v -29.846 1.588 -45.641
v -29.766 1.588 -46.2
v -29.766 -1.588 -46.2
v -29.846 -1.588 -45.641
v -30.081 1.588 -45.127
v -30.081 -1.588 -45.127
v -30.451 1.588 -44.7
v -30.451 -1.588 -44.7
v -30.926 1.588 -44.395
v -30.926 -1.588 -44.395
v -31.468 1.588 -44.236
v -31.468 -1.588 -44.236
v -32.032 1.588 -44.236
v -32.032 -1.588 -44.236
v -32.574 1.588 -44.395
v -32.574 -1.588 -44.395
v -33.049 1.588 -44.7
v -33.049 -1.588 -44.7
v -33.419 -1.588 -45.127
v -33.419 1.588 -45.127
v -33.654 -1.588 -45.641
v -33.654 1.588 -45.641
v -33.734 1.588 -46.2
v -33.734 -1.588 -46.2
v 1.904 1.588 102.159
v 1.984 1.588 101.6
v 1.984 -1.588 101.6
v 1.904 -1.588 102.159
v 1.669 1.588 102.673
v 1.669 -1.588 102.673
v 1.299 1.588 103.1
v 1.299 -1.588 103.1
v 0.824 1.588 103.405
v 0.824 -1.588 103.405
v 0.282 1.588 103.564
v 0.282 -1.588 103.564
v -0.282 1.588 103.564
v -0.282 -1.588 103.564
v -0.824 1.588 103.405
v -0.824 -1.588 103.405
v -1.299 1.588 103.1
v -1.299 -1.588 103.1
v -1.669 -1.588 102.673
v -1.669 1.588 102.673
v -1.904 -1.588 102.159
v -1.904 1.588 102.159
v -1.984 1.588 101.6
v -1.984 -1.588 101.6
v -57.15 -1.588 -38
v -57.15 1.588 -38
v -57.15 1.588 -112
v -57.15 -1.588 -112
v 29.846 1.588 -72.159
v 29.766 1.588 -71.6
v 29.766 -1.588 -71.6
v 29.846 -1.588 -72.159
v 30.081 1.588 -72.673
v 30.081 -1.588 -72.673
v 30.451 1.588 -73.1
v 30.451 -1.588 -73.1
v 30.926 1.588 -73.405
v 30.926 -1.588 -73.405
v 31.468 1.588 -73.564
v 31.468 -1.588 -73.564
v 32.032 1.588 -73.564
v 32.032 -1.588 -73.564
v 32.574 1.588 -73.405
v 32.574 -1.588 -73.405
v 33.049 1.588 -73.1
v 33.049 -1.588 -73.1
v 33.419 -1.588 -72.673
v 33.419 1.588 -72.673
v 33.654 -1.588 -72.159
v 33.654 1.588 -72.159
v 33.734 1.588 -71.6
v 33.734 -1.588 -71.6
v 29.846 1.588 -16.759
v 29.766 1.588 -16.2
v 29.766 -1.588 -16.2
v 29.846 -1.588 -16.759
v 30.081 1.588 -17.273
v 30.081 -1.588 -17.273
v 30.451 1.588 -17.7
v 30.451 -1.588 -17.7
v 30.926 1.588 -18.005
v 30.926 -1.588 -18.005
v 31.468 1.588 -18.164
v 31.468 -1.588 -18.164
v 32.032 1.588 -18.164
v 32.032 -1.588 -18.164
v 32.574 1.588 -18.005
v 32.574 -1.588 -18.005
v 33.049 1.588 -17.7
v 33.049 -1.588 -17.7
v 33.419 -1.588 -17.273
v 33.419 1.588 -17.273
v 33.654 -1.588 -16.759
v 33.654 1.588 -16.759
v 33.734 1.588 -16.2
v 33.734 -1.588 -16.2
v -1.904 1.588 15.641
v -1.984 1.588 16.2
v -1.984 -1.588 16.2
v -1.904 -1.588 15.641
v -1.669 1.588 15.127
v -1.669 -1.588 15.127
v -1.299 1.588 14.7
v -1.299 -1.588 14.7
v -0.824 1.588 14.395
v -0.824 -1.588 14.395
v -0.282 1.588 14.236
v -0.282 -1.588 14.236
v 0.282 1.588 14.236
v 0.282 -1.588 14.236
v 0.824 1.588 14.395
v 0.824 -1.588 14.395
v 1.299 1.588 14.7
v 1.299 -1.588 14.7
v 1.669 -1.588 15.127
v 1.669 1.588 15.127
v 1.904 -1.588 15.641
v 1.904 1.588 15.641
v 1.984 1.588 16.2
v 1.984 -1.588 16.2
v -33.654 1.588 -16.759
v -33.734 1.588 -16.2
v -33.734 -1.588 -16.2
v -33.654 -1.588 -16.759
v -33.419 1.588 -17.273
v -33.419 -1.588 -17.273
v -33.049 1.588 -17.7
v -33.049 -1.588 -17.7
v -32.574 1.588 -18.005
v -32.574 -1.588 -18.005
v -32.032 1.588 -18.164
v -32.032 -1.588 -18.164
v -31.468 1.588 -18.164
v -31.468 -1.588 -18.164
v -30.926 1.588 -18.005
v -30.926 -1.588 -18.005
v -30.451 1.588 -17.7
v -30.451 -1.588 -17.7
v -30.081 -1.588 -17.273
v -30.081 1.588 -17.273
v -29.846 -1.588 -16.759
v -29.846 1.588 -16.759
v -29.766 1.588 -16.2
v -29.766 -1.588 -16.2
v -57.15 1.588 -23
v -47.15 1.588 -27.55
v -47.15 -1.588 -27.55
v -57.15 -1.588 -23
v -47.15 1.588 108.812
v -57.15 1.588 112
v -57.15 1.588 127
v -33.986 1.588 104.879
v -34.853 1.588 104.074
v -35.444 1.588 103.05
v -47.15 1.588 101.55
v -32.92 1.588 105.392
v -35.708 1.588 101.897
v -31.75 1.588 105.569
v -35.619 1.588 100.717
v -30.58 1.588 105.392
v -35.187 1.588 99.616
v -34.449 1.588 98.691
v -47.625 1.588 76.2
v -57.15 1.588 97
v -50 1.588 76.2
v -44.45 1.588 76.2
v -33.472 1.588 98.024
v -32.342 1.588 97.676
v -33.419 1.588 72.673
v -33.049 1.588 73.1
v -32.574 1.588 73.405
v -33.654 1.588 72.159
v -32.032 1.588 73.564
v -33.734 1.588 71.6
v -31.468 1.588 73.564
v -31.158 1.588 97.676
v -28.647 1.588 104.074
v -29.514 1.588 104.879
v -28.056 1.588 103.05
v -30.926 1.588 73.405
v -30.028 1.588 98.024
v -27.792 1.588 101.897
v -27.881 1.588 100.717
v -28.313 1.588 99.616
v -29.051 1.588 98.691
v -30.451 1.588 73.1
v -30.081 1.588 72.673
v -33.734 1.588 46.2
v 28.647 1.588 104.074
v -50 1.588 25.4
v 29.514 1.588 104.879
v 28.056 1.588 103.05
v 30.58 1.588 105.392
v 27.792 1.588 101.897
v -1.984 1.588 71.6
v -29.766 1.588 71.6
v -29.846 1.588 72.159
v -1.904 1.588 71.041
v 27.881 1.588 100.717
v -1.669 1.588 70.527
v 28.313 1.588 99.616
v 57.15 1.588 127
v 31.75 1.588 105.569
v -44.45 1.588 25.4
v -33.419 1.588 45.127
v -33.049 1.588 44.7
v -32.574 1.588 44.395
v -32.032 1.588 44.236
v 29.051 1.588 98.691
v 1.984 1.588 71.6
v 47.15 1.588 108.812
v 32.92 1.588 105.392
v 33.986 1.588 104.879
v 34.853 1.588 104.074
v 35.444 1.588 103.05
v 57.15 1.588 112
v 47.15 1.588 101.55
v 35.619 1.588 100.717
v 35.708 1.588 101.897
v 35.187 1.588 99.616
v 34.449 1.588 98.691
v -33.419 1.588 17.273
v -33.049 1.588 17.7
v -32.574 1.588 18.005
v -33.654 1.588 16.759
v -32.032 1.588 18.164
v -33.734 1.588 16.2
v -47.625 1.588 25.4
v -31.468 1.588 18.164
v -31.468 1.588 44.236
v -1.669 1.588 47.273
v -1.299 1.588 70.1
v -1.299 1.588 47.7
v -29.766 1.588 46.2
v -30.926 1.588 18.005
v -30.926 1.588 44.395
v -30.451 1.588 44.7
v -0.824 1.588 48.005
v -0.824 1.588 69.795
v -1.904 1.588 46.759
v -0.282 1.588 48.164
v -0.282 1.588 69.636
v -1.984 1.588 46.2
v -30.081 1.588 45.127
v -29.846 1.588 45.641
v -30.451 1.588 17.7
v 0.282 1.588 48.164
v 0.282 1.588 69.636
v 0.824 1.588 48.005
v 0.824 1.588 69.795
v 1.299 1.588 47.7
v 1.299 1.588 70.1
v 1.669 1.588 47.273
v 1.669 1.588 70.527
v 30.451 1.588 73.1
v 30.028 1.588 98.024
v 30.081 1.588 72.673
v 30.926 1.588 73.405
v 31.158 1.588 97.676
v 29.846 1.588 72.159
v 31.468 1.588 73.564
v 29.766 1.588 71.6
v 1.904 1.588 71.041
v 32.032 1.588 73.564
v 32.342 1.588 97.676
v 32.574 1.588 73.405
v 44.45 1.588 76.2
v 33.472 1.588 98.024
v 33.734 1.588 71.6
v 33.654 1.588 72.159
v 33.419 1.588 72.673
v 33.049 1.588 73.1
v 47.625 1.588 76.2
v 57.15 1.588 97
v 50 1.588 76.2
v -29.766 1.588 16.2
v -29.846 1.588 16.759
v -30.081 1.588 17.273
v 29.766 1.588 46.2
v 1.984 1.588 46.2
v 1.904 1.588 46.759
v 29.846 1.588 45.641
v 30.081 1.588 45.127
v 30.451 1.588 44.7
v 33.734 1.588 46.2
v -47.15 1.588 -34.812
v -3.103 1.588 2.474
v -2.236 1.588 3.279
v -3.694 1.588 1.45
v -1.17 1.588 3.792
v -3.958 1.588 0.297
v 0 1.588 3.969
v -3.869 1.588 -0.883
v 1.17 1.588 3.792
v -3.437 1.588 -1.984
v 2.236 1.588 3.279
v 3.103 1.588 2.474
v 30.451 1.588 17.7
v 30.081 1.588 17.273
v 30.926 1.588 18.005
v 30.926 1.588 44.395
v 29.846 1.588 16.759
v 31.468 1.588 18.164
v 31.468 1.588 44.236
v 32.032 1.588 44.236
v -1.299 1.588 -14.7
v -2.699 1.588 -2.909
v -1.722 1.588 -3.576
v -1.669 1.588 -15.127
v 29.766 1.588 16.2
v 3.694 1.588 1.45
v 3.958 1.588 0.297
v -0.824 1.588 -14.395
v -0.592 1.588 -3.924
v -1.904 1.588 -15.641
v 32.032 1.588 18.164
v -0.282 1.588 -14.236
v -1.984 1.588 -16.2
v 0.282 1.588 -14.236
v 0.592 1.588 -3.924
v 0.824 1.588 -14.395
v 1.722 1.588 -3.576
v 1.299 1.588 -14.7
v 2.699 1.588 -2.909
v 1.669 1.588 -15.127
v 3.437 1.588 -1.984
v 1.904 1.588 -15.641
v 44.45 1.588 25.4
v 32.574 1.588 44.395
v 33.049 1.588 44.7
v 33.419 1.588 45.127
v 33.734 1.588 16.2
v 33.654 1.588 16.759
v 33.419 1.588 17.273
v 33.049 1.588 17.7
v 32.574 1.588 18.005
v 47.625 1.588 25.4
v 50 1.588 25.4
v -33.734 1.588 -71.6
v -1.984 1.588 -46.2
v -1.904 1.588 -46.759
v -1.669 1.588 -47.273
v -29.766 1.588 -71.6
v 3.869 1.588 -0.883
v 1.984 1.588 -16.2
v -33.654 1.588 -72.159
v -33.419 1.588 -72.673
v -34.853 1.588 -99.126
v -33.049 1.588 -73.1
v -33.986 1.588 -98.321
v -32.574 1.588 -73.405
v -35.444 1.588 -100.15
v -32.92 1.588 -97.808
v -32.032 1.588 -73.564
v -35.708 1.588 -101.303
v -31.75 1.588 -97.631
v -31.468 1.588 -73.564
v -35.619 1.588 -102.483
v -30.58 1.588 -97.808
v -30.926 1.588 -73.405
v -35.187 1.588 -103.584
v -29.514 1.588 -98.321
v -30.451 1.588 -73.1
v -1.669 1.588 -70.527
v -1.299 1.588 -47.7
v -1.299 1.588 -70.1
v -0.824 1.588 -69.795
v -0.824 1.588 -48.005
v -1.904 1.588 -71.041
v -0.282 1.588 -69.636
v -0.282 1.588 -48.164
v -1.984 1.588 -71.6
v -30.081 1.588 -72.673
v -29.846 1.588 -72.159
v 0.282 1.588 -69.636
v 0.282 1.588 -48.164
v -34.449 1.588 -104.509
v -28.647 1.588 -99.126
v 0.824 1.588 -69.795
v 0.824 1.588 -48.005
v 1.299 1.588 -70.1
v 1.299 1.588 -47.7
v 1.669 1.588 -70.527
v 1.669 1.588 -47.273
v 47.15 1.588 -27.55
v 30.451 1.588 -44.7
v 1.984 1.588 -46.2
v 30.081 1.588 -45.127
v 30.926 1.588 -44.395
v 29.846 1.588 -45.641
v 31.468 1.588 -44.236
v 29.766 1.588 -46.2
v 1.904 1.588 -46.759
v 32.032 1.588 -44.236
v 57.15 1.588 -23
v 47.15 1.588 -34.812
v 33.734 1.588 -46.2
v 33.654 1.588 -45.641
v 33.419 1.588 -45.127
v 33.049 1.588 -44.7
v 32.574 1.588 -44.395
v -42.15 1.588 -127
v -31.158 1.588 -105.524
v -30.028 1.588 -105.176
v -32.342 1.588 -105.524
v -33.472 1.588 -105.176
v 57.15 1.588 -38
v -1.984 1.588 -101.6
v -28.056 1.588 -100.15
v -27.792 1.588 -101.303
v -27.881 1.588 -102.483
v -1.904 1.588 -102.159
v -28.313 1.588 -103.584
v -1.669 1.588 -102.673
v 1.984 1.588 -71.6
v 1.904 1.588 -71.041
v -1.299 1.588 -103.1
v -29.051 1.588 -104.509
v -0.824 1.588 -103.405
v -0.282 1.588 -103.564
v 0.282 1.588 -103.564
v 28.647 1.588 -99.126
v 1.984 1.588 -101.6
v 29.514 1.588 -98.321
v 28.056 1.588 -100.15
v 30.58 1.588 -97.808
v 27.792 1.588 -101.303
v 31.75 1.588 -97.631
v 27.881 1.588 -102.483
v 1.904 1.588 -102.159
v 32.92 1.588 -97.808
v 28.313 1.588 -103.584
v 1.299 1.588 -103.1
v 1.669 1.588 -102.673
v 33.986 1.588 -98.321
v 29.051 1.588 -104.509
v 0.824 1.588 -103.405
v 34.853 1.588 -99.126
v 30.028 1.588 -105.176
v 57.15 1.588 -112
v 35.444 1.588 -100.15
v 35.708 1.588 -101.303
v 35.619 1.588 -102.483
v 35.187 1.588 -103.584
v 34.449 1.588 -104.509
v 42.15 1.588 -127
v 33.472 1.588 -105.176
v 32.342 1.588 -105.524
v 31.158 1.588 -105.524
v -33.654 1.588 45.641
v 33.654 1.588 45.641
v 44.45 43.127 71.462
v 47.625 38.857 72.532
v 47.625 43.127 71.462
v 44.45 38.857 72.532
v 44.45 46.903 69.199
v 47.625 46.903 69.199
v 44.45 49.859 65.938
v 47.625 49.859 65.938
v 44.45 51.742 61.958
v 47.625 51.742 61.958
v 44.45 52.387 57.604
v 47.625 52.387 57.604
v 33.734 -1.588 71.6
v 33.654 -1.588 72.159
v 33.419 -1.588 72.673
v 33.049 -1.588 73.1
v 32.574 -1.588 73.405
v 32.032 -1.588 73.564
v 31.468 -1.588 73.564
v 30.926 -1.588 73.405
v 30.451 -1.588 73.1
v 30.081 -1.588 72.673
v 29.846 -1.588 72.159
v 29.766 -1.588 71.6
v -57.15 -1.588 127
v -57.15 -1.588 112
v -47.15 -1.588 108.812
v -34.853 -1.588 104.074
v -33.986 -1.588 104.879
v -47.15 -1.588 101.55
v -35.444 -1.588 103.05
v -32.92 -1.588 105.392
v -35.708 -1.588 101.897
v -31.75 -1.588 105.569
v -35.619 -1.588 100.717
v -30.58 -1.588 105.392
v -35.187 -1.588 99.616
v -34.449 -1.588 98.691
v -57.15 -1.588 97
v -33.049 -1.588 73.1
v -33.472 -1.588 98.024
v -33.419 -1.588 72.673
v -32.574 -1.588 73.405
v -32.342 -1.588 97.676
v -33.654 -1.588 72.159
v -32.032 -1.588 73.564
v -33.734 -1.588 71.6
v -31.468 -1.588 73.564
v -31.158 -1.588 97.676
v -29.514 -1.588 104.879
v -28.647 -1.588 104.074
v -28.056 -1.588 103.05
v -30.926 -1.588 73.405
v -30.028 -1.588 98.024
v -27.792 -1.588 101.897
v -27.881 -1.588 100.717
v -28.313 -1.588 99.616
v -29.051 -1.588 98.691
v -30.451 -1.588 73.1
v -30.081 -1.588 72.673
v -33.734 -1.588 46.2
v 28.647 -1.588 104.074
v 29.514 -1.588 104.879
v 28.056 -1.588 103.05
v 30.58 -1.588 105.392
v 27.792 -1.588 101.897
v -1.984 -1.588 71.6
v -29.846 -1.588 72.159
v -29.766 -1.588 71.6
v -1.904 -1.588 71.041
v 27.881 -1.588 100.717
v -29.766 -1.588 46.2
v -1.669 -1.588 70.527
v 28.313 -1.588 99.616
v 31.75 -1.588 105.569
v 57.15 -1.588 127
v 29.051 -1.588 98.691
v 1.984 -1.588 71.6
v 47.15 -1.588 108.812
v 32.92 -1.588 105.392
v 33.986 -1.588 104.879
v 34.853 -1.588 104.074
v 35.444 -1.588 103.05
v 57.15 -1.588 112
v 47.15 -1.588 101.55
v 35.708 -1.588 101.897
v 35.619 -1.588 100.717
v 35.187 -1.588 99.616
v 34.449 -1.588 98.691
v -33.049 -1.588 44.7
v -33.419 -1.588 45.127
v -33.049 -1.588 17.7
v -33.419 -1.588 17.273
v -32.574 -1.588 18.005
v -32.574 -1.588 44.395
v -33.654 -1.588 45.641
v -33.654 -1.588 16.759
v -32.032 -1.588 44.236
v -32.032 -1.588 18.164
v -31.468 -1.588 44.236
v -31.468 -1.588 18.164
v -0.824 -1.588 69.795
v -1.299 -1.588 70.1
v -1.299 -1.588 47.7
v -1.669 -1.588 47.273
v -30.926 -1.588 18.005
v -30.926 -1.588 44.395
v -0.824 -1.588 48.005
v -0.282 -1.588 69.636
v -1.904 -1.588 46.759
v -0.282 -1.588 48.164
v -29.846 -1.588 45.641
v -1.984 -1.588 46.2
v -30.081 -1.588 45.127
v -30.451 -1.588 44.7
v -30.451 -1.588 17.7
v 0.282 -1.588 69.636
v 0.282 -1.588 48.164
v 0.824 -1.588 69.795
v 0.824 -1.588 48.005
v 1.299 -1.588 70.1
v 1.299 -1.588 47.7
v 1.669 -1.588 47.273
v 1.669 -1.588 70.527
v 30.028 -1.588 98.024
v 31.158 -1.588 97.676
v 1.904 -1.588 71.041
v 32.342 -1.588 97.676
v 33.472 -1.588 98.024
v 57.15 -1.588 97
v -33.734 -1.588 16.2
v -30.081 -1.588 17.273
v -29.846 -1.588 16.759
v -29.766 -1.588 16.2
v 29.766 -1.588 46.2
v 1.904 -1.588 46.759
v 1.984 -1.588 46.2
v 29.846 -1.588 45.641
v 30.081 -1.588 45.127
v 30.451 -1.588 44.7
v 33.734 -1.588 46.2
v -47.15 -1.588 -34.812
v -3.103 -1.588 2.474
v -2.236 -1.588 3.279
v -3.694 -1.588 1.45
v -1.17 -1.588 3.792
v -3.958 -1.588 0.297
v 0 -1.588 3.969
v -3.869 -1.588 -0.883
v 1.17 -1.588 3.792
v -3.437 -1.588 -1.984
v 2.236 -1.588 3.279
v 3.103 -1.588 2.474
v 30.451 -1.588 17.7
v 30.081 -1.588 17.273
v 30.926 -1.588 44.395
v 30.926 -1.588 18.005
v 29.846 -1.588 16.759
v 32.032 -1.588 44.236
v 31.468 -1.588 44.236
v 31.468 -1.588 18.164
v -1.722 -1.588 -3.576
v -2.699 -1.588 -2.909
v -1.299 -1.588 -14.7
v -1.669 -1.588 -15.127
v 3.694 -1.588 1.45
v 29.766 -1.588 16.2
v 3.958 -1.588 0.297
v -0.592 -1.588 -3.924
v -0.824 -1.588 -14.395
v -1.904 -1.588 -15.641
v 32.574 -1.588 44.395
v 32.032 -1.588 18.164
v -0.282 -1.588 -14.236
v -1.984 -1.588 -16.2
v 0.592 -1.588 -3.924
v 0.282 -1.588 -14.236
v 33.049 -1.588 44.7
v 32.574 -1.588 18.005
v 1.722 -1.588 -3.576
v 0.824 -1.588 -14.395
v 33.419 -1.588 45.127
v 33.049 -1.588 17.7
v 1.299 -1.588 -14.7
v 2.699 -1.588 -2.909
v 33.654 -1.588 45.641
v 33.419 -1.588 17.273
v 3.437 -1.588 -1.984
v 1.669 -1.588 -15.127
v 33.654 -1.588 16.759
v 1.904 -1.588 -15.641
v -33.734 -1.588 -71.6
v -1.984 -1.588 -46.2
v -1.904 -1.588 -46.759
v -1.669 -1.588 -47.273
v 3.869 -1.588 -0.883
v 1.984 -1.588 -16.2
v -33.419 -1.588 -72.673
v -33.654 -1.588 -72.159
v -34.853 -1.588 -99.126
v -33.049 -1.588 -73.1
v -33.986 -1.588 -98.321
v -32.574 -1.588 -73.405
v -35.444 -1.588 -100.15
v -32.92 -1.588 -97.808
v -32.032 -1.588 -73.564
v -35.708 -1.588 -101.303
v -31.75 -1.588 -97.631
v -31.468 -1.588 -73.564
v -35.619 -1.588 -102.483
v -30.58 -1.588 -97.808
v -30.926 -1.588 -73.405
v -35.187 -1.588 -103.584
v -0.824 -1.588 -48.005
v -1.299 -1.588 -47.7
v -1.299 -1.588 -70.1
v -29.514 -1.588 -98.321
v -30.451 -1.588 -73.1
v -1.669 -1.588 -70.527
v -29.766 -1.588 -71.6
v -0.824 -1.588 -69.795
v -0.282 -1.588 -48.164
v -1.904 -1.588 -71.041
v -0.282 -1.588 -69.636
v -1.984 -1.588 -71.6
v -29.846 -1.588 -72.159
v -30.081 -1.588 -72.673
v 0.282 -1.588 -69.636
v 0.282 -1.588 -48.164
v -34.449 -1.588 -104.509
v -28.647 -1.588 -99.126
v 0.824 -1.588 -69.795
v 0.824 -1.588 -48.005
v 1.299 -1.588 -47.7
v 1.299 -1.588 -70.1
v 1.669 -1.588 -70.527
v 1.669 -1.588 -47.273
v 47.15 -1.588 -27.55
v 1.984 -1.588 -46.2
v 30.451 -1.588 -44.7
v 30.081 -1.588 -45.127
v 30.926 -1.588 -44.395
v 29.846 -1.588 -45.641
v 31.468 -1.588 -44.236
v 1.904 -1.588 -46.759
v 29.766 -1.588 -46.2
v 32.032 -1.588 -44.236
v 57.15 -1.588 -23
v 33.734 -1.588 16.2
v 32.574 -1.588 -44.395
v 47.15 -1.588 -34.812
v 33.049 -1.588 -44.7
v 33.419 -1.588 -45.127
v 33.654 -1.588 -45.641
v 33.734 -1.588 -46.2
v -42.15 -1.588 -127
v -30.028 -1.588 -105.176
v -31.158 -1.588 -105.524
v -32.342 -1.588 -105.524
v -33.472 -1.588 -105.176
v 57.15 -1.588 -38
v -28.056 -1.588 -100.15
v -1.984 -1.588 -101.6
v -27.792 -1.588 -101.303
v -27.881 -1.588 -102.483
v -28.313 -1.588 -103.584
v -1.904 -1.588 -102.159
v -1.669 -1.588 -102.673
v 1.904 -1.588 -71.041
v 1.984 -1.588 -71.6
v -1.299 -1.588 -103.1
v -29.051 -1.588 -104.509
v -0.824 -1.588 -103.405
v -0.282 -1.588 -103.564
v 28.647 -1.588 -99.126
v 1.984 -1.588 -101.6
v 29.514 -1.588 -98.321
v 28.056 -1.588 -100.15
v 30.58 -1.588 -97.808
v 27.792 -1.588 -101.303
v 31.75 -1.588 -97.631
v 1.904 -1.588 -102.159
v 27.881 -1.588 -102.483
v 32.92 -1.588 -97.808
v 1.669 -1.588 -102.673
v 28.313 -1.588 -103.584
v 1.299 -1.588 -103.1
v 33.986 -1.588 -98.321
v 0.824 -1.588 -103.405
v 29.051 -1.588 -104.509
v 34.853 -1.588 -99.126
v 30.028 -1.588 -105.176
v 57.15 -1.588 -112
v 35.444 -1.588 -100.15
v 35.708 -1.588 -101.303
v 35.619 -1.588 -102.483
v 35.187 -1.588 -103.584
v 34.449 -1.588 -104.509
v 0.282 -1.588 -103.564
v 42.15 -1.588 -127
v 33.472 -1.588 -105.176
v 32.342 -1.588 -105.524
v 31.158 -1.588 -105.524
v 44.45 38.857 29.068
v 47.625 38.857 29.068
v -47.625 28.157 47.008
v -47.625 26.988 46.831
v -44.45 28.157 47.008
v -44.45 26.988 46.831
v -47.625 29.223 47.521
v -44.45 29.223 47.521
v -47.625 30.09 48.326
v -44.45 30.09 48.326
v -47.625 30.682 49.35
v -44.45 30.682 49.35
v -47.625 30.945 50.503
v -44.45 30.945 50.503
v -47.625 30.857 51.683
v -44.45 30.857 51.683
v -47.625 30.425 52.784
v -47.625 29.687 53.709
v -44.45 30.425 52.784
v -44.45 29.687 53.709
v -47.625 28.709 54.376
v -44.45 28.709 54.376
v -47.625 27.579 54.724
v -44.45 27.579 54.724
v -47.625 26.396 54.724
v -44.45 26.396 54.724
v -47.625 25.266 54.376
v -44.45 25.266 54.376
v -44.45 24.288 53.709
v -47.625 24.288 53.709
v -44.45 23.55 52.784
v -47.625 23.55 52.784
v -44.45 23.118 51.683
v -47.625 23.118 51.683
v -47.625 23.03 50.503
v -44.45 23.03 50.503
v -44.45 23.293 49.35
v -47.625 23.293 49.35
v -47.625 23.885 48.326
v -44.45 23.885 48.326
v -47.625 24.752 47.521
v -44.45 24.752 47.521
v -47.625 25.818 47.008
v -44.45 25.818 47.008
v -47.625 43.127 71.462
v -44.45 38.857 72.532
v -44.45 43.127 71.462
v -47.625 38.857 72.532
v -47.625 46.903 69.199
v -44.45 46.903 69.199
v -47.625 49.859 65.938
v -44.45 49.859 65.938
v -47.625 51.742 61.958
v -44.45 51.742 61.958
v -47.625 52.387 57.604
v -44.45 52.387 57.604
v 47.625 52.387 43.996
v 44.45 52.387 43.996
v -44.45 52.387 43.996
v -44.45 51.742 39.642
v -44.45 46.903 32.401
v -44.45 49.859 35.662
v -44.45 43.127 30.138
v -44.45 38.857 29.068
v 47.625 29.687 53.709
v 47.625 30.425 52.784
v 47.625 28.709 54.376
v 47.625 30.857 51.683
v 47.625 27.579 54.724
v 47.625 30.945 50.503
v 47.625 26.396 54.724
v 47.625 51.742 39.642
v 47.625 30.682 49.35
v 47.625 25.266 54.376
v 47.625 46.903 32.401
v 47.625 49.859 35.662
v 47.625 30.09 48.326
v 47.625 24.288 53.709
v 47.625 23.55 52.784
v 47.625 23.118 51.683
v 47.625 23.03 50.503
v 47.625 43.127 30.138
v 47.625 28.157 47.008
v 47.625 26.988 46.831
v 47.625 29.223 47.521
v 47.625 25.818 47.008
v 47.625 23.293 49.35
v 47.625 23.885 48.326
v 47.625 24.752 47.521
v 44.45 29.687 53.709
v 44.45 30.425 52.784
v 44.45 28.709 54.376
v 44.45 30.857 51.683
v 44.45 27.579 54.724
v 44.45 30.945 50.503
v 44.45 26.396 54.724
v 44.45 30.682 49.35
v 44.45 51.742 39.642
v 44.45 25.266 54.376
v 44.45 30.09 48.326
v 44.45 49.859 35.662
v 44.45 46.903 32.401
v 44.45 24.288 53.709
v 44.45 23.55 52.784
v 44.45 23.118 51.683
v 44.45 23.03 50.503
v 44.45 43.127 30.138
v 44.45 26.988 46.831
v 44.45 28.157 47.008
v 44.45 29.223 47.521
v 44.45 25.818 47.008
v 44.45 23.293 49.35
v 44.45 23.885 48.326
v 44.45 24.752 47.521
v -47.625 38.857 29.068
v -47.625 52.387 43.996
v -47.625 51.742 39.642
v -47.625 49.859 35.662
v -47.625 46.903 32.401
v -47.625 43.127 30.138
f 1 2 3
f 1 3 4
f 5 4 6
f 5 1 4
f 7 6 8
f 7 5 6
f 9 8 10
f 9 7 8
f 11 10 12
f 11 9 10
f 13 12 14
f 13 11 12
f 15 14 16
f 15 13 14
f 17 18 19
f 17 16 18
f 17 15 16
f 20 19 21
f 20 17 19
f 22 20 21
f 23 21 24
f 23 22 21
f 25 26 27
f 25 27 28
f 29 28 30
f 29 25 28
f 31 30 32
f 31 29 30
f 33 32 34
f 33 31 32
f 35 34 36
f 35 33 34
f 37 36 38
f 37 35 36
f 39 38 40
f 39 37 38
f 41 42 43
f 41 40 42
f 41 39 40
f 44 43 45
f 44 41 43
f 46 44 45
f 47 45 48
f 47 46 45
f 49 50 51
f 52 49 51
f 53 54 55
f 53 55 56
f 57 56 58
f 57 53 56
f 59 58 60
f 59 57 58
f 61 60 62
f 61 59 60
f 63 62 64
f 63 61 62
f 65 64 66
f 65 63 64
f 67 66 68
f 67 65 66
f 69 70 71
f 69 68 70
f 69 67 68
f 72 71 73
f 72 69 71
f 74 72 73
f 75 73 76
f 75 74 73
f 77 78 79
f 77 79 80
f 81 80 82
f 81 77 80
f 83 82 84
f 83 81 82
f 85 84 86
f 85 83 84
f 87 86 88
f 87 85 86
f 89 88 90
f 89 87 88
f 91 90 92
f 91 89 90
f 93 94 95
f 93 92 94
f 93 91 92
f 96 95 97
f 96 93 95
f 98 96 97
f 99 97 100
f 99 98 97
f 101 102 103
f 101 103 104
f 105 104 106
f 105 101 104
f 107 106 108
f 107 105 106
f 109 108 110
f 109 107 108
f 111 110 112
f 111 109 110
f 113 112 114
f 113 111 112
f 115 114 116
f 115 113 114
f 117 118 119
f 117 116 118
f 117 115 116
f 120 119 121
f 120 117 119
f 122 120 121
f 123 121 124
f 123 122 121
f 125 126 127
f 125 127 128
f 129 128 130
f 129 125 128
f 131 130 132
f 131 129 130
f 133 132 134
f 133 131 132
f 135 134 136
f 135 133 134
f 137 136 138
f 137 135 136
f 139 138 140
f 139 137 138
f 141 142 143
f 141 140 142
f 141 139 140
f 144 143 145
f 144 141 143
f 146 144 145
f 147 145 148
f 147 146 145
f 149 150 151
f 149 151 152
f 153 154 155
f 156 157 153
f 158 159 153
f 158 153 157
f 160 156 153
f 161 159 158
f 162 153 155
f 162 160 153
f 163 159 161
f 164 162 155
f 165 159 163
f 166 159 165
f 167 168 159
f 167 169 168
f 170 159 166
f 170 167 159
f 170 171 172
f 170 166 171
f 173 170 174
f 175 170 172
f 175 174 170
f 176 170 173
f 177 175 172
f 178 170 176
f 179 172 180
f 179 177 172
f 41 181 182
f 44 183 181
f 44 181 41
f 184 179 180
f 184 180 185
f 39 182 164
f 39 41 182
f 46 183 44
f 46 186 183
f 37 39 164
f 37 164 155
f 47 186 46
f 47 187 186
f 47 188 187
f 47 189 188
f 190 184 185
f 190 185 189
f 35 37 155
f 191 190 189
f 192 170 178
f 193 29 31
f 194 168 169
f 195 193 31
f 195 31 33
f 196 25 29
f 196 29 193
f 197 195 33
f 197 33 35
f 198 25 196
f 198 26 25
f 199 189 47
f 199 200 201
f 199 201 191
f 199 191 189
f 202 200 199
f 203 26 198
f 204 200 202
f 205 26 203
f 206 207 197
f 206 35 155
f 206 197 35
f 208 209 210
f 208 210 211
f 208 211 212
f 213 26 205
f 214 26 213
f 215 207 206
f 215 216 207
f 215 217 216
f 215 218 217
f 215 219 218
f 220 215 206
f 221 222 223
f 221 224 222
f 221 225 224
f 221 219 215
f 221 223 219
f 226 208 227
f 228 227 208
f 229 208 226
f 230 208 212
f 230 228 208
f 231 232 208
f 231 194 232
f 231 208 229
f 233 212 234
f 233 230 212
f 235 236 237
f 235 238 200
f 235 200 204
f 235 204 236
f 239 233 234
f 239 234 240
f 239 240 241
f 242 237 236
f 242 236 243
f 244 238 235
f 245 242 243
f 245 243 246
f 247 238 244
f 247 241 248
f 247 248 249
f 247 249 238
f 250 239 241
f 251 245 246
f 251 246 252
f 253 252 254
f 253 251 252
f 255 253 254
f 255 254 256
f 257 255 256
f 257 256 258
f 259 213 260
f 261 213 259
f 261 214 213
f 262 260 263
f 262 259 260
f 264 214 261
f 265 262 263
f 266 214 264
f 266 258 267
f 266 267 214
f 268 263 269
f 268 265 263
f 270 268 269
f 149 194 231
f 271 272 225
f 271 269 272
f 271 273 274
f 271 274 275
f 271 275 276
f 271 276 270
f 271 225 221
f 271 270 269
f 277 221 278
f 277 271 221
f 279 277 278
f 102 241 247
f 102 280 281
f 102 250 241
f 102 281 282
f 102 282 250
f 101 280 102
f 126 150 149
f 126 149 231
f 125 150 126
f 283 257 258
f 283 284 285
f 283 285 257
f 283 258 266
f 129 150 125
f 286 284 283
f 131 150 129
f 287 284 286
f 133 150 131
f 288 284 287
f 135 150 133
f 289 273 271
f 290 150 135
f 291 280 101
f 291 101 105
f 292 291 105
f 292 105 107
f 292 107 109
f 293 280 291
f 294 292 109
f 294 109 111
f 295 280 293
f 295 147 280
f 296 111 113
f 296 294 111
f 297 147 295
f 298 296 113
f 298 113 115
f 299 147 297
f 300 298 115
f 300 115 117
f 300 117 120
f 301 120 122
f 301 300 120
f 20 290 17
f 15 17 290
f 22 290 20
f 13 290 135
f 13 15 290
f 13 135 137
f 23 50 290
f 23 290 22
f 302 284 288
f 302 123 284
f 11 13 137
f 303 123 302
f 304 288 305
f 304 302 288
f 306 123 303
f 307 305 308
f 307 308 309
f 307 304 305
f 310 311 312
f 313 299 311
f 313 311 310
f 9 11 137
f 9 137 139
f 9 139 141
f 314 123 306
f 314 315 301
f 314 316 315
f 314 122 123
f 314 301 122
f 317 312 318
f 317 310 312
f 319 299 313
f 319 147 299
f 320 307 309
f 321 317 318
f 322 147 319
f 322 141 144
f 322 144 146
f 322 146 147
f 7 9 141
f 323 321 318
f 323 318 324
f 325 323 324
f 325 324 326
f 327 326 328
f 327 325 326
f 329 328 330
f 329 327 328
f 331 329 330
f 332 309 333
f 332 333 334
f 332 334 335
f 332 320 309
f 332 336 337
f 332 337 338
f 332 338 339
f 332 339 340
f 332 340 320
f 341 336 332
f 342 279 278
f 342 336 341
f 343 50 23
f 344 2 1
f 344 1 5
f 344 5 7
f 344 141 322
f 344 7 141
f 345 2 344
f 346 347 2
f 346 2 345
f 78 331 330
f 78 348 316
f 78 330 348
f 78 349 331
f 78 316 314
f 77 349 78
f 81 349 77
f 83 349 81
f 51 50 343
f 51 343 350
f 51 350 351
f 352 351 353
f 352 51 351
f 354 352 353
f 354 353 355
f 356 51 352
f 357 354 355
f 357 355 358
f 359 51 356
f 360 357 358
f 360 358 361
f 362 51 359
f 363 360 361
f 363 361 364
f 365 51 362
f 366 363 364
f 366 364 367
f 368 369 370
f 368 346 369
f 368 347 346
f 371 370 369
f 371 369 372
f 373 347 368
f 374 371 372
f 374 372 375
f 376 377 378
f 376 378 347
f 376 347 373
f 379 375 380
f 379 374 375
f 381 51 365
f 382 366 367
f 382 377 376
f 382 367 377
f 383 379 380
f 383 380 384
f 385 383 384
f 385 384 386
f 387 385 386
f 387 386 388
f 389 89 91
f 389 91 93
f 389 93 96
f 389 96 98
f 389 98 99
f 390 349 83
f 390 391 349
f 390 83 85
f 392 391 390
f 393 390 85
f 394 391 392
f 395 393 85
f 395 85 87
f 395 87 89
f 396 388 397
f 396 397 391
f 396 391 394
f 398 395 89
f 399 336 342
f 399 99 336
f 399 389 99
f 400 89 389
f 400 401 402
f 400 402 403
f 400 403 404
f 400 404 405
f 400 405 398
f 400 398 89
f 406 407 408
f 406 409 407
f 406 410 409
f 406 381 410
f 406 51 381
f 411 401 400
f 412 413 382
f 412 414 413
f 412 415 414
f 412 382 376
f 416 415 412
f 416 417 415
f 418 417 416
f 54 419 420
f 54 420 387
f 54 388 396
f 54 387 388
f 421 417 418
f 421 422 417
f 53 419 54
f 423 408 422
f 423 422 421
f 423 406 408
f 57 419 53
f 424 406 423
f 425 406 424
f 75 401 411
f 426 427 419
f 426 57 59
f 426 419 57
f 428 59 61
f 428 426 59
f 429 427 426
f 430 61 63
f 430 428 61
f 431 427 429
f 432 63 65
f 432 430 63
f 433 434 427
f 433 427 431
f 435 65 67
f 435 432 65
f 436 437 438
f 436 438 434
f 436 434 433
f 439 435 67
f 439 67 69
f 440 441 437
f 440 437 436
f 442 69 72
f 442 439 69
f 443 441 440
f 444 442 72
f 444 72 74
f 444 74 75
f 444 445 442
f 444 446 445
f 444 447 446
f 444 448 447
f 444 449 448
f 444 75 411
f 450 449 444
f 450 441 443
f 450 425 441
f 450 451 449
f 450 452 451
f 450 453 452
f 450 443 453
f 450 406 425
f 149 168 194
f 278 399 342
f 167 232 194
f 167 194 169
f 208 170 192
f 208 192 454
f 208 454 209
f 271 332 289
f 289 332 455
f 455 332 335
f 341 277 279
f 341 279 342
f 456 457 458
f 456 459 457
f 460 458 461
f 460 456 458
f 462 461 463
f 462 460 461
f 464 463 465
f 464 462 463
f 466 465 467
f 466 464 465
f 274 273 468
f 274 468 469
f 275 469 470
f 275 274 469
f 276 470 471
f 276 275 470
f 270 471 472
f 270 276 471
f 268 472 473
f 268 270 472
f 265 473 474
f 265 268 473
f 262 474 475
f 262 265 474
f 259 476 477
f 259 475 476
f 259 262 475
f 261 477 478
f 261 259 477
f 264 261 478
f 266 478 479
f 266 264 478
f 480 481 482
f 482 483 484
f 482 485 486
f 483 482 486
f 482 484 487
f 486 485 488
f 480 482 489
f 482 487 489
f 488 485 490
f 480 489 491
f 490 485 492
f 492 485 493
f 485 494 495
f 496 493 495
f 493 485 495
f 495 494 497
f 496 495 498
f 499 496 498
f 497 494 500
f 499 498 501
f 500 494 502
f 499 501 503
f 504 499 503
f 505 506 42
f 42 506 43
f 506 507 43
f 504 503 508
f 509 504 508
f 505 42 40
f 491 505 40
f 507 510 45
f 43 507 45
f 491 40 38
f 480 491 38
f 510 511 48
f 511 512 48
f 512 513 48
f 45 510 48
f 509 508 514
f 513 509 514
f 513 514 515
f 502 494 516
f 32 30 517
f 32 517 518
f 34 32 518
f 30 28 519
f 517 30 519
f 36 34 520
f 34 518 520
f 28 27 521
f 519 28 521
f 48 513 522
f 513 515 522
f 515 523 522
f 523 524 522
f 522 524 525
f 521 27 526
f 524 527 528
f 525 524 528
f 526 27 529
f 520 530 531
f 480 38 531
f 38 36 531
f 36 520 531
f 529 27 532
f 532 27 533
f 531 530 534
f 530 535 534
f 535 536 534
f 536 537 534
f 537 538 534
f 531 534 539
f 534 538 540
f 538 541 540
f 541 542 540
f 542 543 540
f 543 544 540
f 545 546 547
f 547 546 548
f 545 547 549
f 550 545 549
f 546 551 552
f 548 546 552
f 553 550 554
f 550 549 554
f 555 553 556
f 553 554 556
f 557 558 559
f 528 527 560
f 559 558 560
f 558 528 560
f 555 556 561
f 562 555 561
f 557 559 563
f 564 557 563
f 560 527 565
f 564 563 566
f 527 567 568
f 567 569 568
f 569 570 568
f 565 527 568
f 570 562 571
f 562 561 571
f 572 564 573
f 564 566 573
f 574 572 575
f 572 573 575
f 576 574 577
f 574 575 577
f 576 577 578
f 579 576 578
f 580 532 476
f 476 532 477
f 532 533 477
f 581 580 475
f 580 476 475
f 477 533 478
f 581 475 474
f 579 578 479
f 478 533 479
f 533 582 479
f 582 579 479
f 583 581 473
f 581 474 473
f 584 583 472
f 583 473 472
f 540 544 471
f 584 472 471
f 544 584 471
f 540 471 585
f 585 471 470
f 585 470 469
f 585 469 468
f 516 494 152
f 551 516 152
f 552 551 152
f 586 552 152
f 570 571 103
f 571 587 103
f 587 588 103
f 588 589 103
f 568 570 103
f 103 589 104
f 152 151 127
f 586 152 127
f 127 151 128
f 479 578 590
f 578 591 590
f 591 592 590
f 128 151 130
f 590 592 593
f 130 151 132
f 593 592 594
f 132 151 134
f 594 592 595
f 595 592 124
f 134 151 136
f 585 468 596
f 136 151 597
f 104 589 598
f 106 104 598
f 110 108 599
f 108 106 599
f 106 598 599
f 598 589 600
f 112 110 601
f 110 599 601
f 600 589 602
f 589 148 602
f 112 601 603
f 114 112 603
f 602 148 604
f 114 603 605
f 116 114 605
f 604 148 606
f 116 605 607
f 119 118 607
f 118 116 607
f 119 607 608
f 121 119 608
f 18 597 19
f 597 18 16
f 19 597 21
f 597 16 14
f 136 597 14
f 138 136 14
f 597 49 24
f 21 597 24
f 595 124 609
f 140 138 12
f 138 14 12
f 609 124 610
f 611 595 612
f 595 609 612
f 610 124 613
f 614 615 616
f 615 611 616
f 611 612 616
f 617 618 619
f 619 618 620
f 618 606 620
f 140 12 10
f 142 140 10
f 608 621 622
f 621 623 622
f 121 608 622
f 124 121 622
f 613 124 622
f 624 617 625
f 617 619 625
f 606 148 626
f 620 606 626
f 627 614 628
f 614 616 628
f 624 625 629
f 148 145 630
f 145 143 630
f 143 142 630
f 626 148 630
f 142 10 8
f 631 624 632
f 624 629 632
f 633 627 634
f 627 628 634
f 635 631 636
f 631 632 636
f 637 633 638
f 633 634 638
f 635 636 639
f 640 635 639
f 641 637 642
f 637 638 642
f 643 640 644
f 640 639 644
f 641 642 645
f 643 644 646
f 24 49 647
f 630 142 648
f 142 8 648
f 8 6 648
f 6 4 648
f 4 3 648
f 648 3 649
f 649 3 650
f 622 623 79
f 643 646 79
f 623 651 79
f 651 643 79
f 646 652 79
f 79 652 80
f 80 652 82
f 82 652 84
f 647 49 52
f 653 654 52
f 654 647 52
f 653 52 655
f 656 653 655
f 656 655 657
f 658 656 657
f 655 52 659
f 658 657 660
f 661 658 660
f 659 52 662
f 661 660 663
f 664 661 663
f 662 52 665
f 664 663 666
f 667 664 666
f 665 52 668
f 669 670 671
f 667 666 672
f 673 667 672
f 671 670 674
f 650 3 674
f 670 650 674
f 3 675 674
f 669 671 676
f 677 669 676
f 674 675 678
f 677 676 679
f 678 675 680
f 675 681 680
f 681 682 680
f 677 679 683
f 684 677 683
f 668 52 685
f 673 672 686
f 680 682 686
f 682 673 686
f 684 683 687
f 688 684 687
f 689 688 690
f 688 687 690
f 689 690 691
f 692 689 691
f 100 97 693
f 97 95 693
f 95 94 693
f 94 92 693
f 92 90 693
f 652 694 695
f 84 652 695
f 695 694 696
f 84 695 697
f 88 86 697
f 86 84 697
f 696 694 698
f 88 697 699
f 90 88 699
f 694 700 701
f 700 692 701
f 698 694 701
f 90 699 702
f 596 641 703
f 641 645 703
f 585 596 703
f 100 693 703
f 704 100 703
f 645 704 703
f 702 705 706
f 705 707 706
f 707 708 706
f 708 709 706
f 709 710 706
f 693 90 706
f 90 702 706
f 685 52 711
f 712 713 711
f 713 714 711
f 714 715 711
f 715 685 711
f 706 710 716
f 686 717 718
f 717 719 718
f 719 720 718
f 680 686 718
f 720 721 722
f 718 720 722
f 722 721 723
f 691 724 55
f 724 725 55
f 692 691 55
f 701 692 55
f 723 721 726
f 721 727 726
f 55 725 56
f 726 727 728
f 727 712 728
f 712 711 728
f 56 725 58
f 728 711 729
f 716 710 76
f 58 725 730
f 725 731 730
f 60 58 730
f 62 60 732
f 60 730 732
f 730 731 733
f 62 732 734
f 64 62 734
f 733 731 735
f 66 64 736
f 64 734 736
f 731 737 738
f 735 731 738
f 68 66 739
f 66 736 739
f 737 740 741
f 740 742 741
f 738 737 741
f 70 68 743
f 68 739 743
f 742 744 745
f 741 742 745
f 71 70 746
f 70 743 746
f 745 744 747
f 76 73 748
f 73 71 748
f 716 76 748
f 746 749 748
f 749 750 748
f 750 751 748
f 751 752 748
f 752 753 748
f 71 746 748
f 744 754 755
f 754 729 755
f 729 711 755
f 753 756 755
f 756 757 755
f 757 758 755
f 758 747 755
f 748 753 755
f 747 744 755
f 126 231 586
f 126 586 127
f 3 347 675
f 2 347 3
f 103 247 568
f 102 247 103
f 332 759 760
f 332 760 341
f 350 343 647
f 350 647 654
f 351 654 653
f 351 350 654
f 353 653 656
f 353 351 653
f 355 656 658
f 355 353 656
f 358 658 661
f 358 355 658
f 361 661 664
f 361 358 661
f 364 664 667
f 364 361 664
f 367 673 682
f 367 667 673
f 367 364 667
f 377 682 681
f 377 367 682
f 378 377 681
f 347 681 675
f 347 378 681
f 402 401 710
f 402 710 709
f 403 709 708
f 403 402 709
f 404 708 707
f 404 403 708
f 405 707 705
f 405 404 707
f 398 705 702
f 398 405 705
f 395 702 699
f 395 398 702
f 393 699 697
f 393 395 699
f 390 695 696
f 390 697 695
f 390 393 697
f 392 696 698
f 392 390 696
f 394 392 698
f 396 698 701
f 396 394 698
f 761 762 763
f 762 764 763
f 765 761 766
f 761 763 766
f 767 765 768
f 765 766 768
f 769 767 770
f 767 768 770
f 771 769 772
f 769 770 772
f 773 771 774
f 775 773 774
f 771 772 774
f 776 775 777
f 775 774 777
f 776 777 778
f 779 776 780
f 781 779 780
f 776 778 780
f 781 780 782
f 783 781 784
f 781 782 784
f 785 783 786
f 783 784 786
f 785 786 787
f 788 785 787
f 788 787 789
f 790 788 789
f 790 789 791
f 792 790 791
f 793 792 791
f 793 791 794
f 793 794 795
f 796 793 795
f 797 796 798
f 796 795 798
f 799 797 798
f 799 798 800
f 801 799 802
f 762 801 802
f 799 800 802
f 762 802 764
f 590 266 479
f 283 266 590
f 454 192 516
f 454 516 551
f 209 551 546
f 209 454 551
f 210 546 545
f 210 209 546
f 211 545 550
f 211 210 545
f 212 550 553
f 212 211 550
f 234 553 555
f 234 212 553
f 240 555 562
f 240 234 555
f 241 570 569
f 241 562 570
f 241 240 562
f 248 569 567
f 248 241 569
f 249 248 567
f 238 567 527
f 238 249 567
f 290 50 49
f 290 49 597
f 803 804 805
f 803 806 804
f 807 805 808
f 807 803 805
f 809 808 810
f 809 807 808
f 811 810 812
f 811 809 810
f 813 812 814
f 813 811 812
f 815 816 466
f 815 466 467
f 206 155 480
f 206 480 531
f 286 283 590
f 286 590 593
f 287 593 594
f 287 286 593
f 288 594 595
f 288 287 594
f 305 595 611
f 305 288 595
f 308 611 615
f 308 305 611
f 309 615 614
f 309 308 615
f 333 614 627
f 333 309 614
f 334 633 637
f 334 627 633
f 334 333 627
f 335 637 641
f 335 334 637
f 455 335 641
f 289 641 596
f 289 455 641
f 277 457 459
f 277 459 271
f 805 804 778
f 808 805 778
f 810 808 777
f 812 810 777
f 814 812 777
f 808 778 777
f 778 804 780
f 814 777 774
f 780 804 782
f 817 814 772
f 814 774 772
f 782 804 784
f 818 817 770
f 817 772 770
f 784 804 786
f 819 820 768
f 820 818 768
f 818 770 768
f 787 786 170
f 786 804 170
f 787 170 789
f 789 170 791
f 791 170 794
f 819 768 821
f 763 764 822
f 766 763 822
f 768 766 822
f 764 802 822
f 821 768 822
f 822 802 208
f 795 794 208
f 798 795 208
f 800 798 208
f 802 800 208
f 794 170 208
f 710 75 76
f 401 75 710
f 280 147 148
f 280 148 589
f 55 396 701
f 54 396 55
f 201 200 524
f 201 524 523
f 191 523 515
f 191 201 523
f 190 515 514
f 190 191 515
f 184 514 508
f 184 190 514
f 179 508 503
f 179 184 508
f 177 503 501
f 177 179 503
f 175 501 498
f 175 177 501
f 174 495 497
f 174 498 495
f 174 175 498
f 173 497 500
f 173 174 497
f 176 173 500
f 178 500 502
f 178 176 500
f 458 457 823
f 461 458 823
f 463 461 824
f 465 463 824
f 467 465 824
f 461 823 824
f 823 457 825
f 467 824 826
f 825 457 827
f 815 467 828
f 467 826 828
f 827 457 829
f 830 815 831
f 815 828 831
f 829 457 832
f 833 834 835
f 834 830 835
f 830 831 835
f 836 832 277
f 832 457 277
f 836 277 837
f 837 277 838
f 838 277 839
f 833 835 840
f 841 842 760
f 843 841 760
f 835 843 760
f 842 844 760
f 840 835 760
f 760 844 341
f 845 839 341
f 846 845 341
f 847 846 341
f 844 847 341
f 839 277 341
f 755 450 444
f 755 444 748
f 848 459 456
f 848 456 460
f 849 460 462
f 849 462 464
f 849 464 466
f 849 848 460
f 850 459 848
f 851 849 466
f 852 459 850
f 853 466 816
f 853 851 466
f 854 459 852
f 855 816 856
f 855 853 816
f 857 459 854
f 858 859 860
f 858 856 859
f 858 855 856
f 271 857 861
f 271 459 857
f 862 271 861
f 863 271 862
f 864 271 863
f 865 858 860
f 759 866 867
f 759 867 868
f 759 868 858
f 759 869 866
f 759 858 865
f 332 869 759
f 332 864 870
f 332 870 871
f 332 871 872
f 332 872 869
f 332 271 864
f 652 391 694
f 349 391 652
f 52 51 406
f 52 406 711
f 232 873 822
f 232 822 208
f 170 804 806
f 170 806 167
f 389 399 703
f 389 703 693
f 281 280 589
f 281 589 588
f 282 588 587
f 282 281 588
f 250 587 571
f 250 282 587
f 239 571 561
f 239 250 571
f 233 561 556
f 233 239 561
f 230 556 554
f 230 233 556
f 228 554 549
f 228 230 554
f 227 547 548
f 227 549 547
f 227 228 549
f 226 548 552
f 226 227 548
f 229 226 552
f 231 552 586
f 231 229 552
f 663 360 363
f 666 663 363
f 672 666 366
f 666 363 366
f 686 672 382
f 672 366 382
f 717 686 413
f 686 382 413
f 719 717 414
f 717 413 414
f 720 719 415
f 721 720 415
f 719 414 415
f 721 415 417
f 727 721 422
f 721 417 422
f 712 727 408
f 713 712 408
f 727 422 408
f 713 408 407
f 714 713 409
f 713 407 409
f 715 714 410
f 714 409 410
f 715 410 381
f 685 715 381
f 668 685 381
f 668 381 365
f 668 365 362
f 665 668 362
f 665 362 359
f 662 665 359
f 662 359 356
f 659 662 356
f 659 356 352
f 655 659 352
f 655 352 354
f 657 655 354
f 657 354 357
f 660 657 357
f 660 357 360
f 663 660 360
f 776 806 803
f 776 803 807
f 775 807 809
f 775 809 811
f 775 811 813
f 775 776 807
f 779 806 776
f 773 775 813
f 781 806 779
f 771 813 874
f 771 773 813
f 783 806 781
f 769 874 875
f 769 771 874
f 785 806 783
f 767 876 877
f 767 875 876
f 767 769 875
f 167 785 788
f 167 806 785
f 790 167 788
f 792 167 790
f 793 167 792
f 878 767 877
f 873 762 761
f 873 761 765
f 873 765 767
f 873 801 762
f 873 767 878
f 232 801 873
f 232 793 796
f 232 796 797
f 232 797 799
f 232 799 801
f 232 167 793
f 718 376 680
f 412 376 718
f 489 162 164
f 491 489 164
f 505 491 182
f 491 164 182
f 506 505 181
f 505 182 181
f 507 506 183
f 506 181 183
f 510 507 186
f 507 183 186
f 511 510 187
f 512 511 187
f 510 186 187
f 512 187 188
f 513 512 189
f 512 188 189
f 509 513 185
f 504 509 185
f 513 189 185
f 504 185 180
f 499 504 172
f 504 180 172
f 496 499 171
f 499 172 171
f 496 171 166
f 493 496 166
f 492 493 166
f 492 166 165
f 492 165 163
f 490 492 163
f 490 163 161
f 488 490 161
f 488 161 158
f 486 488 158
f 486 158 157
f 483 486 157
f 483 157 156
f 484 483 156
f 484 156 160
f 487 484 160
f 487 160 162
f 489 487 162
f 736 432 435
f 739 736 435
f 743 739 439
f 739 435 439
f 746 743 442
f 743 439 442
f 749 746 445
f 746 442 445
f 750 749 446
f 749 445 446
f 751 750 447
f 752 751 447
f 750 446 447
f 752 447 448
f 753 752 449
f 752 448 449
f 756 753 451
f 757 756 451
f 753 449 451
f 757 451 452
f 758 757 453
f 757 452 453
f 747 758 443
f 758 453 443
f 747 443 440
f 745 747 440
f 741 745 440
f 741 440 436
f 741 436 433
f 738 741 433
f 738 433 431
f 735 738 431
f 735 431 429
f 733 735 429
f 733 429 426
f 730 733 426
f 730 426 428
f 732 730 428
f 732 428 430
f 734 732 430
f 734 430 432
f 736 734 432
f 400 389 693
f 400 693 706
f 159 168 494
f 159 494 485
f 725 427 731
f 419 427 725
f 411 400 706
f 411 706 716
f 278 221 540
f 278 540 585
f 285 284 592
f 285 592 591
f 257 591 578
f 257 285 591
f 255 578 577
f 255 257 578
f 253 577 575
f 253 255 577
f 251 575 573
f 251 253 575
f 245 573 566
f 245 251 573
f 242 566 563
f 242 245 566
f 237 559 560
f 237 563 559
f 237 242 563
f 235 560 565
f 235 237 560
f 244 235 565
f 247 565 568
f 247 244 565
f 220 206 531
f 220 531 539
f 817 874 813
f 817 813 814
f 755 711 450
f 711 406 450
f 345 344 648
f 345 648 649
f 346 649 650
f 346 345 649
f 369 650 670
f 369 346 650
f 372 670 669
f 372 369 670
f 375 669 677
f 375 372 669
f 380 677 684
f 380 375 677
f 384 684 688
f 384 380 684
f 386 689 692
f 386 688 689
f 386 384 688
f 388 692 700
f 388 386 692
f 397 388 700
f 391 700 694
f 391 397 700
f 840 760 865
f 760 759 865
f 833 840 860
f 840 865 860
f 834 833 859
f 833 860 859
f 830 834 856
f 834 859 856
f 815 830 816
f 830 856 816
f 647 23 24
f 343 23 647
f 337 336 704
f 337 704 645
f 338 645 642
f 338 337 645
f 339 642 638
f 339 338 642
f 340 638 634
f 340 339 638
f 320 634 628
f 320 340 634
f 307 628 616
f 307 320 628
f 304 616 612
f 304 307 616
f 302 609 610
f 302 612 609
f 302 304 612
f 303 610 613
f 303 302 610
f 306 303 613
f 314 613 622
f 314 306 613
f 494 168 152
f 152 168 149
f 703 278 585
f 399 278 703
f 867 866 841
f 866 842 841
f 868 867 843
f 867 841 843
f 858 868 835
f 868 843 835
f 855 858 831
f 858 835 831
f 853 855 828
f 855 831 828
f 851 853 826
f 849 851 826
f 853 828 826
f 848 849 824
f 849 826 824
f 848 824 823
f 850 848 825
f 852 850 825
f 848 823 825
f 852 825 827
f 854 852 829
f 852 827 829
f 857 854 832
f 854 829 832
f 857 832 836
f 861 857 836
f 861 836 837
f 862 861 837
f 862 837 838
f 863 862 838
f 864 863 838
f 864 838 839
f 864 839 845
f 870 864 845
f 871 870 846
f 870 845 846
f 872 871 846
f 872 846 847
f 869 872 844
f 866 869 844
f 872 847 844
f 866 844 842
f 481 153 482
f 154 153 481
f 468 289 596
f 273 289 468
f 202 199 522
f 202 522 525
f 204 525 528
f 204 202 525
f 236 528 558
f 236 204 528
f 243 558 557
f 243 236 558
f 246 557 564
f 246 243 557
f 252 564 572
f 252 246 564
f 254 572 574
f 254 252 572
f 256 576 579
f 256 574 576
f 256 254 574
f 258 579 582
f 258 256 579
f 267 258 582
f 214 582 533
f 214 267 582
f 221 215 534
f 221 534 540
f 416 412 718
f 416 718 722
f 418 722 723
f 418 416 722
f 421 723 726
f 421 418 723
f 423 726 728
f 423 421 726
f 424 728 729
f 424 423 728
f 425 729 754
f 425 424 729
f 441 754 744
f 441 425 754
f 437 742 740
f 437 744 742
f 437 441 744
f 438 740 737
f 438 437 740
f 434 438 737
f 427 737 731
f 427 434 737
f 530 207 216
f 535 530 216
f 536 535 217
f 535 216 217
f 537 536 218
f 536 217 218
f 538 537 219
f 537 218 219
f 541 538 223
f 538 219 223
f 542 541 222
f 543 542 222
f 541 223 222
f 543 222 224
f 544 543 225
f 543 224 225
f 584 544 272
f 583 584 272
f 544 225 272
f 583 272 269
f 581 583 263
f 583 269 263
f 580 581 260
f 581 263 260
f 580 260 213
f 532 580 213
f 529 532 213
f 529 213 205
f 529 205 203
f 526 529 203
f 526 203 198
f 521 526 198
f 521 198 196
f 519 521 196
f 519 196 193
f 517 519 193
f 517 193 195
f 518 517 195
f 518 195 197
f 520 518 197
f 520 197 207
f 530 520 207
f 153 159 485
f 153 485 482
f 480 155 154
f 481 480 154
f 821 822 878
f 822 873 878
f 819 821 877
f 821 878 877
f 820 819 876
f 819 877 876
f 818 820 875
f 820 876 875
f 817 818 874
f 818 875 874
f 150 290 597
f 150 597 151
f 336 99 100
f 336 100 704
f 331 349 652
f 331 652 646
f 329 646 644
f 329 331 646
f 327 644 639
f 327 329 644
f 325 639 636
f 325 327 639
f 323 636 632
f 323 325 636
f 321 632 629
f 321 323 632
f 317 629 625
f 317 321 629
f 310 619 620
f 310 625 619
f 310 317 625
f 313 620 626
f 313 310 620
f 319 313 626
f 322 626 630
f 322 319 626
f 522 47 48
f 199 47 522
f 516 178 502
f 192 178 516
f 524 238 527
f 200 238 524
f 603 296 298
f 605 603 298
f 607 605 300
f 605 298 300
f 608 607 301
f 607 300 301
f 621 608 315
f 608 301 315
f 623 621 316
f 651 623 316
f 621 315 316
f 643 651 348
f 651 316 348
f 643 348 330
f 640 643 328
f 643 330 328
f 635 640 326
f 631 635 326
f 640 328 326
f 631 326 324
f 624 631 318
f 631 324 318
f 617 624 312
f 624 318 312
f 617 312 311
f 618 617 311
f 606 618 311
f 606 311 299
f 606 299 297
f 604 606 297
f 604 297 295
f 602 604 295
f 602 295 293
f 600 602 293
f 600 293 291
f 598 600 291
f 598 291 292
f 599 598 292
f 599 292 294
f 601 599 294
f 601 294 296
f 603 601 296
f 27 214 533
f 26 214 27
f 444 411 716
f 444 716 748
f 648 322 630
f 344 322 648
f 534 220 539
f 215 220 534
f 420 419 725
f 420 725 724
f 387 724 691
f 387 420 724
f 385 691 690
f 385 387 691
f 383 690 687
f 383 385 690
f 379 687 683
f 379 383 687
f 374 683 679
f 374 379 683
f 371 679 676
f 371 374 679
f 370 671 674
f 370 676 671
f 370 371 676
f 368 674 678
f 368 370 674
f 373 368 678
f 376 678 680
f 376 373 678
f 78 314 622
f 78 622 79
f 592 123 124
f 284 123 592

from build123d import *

# Parameters (mm, degrees)
SKETCH1_W           = 114.3
SKETCH1_H           = 254
BOSS_EXTRUDE1_DEPTH = 1.5875
SKETCH2_W           = 3.175
SKETCH2_H           = 50.8
BOSS_EXTRUDE2_DEPTH = 50.8
CUT_EXTRUDE1_DEPTH  = 50
SKETCH4_R           = 3.96875
CUT_EXTRUDE2_DEPTH  = 50
SKETCH5_R           = 3.96875
CUT_EXTRUDE3_DEPTH  = 100
CHAMFER1_SIZE       = 15
FILLET1_R           = 15


with BuildPart() as part:
    # Sketch1 → Boss-Extrude1 (new, symmetric)
    with BuildSketch(Plane(origin=(0, 0, 0), x_dir=(1, 0, 0), z_dir=(0, 1, 0))):
        Rectangle(SKETCH1_W, SKETCH1_H)
    extrude(amount=BOSS_EXTRUDE1_DEPTH, both=True)

    # Sketch2 → Boss-Extrude2 (add)
    with BuildSketch(Plane(origin=(0, 1.5875, 0), x_dir=(1, 0, 0), z_dir=(0, 1, 0))):
        with Locations((46.0375, -50.8)):
            Rectangle(SKETCH2_W, SKETCH2_H)
        with Locations((-46.0375, -50.8)):
            Rectangle(SKETCH2_W, SKETCH2_H)
    extrude(amount=BOSS_EXTRUDE2_DEPTH)

    # Sketch3 → Cut-Extrude1 (cut, symmetric)
    with BuildSketch(Plane(origin=(0, 0, 0), x_dir=(0, 0, -1), z_dir=(1, 0, 0))):
        Polygon((-25.4, 1.5875), (-25.4, 52.3875), (-30.4, 52.3875), align=None)
        Polygon((-76.2, 52.3875), (-71.2, 52.3875), (-76.2, 1.5875), align=None)
    extrude(amount=CUT_EXTRUDE1_DEPTH, both=True, mode=Mode.SUBTRACT)

    # Sketch4 → Cut-Extrude2 (cut, symmetric)
    with BuildSketch(Plane(origin=(0, 0, 0), x_dir=(0, 0, -1), z_dir=(1, 0, 0))):
        with Locations((-50.8, 26.9875)):
            Circle(SKETCH4_R)
    extrude(amount=CUT_EXTRUDE2_DEPTH, both=True, mode=Mode.SUBTRACT)

    # Sketch5 → Cut-Extrude3 (cut)
    with BuildSketch(Plane(origin=(0, 1.5875, 0), x_dir=(1, 0, 0), z_dir=(0, 1, 0))):
        with Locations(Location((31.75, -101.6, 0), (0, 0, 270))):
            Circle(SKETCH5_R)
        with Locations(Location((-31.75, -101.6, 0), (0, 0, 270))):
            Circle(SKETCH5_R)
        with Locations(Location((31.75, 101.6, 0), (0, 0, 270))):
            Circle(SKETCH5_R)
        with Locations(Location((-31.75, 101.6, 0), (0, 0, 270))):
            Circle(SKETCH5_R)
        with Locations(Location((0, 0, 0), (0, 0, 270))):
            Circle(SKETCH5_R)
        with BuildLine():
            Line((-1.984375, -101.6), (-1.984375, -71.6))
            ThreePointArc((-1.984375, -71.6), (0, -69.615625), (1.984375, -71.6))
            Line((1.984375, -71.6), (1.984375, -101.6))
            ThreePointArc((1.984375, -101.6), (0, -103.584375), (-1.984375, -101.6))
        make_face()
        with BuildLine():
            Line((-1.984375, -46.2), (-1.984375, -16.2))
            ThreePointArc((-1.984375, -16.2), (0, -14.215625), (1.984375, -16.2))
            Line((1.984375, -16.2), (1.984375, -46.2))
            ThreePointArc((1.984375, -46.2), (0, -48.184375), (-1.984375, -46.2))
        make_face()
        with BuildLine():
            Line((-1.984375, 16.2), (-1.984375, 46.2))
            ThreePointArc((-1.984375, 46.2), (0, 48.184375), (1.984375, 46.2))
            Line((1.984375, 46.2), (1.984375, 16.2))
            ThreePointArc((1.984375, 16.2), (0, 14.215625), (-1.984375, 16.2))
        make_face()
        with BuildLine():
            Line((-1.984375, 71.6), (-1.984375, 101.6))
            ThreePointArc((-1.984375, 101.6), (0, 103.584375), (1.984375, 101.6))
            Line((1.984375, 101.6), (1.984375, 71.6))
            ThreePointArc((1.984375, 71.6), (0, 69.615625), (-1.984375, 71.6))
        make_face()
        with BuildLine():
            Line((33.734375, -46.2), (33.734375, -71.6))
            ThreePointArc((33.734375, -71.6), (31.75, -73.584375), (29.765625, -71.6))
            Line((29.765625, -71.6), (29.765625, -46.2))
            ThreePointArc((29.765625, -46.2), (31.75, -44.215625), (33.734375, -46.2))
        make_face()
        with BuildLine():
            Line((33.734375, 16.2), (33.734375, -16.2))
            ThreePointArc((33.734375, -16.2), (31.75, -18.184375), (29.765625, -16.2))
            Line((29.765625, -16.2), (29.765625, 16.2))
            ThreePointArc((29.765625, 16.2), (31.75, 18.184375), (33.734375, 16.2))
        make_face()
        with BuildLine():
            Line((33.734375, 71.6), (33.734375, 46.2))
            ThreePointArc((33.734375, 46.2), (31.75, 44.215625), (29.765625, 46.2))
            Line((29.765625, 46.2), (29.765625, 71.6))
            ThreePointArc((29.765625, 71.6), (31.75, 73.584375), (33.734375, 71.6))
        make_face()
        with BuildLine():
            Line((-29.765625, -46.2), (-29.765625, -71.6))
            ThreePointArc((-29.765625, -71.6), (-31.75, -73.584375), (-33.734375, -71.6))
            Line((-33.734375, -71.6), (-33.734375, -46.2))
            ThreePointArc((-33.734375, -46.2), (-31.75, -44.215625), (-29.765625, -46.2))
        make_face()
        with BuildLine():
            Line((-29.765625, 16.2), (-29.765625, -16.2))
            ThreePointArc((-29.765625, -16.2), (-31.75, -18.184375), (-33.734375, -16.2))
            Line((-33.734375, -16.2), (-33.734375, 16.2))
            ThreePointArc((-33.734375, 16.2), (-31.75, 18.184375), (-29.765625, 16.2))
        make_face()
        with BuildLine():
            Line((-29.765625, 71.6), (-29.765625, 46.2))
            ThreePointArc((-29.765625, 46.2), (-31.75, 44.215625), (-33.734375, 46.2))
            Line((-33.734375, 46.2), (-33.734375, 71.6))
            ThreePointArc((-33.734375, 71.6), (-31.75, 73.584375), (-29.765625, 71.6))
        make_face()
        Polygon((57.15, 38), (57.15, 23), (47.15, 27.550166045), (47.15, 34.812409498), align=None)
        Polygon((-47.15, 27.550166045), (-57.15, 23), (-57.15, 38), (-47.15, 34.812409498), align=None)
        Polygon((47.15, -101.550166045), (57.15, -97), (57.15, -112), (47.15, -108.812409498), align=None)
        Polygon((-57.15, -112), (-57.15, -97), (-47.15, -101.550166045), (-47.15, -108.812409498), align=None)
    extrude(amount=-CUT_EXTRUDE3_DEPTH, mode=Mode.SUBTRACT)

    # Chamfer1
    chamfer1_edges = [part.edges().sort_by_distance(p)[0] for p in [
        (-57.15, 0, -127),
        (57.15, 0, -127),
    ]]
    chamfer(chamfer1_edges, length=CHAMFER1_SIZE)

    # Fillet1
    fillet1_edges = [part.edges().sort_by_distance(p)[0] for p in [
        (-46.0375, 52.3875, 71.2),
        (-46.0375, 52.3875, 30.4),
        (46.0375, 52.3875, 30.4),
        (46.0375, 52.3875, 71.2),
    ]]
    fillet(fillet1_edges, radius=FILLET1_R)


solid = part.part
